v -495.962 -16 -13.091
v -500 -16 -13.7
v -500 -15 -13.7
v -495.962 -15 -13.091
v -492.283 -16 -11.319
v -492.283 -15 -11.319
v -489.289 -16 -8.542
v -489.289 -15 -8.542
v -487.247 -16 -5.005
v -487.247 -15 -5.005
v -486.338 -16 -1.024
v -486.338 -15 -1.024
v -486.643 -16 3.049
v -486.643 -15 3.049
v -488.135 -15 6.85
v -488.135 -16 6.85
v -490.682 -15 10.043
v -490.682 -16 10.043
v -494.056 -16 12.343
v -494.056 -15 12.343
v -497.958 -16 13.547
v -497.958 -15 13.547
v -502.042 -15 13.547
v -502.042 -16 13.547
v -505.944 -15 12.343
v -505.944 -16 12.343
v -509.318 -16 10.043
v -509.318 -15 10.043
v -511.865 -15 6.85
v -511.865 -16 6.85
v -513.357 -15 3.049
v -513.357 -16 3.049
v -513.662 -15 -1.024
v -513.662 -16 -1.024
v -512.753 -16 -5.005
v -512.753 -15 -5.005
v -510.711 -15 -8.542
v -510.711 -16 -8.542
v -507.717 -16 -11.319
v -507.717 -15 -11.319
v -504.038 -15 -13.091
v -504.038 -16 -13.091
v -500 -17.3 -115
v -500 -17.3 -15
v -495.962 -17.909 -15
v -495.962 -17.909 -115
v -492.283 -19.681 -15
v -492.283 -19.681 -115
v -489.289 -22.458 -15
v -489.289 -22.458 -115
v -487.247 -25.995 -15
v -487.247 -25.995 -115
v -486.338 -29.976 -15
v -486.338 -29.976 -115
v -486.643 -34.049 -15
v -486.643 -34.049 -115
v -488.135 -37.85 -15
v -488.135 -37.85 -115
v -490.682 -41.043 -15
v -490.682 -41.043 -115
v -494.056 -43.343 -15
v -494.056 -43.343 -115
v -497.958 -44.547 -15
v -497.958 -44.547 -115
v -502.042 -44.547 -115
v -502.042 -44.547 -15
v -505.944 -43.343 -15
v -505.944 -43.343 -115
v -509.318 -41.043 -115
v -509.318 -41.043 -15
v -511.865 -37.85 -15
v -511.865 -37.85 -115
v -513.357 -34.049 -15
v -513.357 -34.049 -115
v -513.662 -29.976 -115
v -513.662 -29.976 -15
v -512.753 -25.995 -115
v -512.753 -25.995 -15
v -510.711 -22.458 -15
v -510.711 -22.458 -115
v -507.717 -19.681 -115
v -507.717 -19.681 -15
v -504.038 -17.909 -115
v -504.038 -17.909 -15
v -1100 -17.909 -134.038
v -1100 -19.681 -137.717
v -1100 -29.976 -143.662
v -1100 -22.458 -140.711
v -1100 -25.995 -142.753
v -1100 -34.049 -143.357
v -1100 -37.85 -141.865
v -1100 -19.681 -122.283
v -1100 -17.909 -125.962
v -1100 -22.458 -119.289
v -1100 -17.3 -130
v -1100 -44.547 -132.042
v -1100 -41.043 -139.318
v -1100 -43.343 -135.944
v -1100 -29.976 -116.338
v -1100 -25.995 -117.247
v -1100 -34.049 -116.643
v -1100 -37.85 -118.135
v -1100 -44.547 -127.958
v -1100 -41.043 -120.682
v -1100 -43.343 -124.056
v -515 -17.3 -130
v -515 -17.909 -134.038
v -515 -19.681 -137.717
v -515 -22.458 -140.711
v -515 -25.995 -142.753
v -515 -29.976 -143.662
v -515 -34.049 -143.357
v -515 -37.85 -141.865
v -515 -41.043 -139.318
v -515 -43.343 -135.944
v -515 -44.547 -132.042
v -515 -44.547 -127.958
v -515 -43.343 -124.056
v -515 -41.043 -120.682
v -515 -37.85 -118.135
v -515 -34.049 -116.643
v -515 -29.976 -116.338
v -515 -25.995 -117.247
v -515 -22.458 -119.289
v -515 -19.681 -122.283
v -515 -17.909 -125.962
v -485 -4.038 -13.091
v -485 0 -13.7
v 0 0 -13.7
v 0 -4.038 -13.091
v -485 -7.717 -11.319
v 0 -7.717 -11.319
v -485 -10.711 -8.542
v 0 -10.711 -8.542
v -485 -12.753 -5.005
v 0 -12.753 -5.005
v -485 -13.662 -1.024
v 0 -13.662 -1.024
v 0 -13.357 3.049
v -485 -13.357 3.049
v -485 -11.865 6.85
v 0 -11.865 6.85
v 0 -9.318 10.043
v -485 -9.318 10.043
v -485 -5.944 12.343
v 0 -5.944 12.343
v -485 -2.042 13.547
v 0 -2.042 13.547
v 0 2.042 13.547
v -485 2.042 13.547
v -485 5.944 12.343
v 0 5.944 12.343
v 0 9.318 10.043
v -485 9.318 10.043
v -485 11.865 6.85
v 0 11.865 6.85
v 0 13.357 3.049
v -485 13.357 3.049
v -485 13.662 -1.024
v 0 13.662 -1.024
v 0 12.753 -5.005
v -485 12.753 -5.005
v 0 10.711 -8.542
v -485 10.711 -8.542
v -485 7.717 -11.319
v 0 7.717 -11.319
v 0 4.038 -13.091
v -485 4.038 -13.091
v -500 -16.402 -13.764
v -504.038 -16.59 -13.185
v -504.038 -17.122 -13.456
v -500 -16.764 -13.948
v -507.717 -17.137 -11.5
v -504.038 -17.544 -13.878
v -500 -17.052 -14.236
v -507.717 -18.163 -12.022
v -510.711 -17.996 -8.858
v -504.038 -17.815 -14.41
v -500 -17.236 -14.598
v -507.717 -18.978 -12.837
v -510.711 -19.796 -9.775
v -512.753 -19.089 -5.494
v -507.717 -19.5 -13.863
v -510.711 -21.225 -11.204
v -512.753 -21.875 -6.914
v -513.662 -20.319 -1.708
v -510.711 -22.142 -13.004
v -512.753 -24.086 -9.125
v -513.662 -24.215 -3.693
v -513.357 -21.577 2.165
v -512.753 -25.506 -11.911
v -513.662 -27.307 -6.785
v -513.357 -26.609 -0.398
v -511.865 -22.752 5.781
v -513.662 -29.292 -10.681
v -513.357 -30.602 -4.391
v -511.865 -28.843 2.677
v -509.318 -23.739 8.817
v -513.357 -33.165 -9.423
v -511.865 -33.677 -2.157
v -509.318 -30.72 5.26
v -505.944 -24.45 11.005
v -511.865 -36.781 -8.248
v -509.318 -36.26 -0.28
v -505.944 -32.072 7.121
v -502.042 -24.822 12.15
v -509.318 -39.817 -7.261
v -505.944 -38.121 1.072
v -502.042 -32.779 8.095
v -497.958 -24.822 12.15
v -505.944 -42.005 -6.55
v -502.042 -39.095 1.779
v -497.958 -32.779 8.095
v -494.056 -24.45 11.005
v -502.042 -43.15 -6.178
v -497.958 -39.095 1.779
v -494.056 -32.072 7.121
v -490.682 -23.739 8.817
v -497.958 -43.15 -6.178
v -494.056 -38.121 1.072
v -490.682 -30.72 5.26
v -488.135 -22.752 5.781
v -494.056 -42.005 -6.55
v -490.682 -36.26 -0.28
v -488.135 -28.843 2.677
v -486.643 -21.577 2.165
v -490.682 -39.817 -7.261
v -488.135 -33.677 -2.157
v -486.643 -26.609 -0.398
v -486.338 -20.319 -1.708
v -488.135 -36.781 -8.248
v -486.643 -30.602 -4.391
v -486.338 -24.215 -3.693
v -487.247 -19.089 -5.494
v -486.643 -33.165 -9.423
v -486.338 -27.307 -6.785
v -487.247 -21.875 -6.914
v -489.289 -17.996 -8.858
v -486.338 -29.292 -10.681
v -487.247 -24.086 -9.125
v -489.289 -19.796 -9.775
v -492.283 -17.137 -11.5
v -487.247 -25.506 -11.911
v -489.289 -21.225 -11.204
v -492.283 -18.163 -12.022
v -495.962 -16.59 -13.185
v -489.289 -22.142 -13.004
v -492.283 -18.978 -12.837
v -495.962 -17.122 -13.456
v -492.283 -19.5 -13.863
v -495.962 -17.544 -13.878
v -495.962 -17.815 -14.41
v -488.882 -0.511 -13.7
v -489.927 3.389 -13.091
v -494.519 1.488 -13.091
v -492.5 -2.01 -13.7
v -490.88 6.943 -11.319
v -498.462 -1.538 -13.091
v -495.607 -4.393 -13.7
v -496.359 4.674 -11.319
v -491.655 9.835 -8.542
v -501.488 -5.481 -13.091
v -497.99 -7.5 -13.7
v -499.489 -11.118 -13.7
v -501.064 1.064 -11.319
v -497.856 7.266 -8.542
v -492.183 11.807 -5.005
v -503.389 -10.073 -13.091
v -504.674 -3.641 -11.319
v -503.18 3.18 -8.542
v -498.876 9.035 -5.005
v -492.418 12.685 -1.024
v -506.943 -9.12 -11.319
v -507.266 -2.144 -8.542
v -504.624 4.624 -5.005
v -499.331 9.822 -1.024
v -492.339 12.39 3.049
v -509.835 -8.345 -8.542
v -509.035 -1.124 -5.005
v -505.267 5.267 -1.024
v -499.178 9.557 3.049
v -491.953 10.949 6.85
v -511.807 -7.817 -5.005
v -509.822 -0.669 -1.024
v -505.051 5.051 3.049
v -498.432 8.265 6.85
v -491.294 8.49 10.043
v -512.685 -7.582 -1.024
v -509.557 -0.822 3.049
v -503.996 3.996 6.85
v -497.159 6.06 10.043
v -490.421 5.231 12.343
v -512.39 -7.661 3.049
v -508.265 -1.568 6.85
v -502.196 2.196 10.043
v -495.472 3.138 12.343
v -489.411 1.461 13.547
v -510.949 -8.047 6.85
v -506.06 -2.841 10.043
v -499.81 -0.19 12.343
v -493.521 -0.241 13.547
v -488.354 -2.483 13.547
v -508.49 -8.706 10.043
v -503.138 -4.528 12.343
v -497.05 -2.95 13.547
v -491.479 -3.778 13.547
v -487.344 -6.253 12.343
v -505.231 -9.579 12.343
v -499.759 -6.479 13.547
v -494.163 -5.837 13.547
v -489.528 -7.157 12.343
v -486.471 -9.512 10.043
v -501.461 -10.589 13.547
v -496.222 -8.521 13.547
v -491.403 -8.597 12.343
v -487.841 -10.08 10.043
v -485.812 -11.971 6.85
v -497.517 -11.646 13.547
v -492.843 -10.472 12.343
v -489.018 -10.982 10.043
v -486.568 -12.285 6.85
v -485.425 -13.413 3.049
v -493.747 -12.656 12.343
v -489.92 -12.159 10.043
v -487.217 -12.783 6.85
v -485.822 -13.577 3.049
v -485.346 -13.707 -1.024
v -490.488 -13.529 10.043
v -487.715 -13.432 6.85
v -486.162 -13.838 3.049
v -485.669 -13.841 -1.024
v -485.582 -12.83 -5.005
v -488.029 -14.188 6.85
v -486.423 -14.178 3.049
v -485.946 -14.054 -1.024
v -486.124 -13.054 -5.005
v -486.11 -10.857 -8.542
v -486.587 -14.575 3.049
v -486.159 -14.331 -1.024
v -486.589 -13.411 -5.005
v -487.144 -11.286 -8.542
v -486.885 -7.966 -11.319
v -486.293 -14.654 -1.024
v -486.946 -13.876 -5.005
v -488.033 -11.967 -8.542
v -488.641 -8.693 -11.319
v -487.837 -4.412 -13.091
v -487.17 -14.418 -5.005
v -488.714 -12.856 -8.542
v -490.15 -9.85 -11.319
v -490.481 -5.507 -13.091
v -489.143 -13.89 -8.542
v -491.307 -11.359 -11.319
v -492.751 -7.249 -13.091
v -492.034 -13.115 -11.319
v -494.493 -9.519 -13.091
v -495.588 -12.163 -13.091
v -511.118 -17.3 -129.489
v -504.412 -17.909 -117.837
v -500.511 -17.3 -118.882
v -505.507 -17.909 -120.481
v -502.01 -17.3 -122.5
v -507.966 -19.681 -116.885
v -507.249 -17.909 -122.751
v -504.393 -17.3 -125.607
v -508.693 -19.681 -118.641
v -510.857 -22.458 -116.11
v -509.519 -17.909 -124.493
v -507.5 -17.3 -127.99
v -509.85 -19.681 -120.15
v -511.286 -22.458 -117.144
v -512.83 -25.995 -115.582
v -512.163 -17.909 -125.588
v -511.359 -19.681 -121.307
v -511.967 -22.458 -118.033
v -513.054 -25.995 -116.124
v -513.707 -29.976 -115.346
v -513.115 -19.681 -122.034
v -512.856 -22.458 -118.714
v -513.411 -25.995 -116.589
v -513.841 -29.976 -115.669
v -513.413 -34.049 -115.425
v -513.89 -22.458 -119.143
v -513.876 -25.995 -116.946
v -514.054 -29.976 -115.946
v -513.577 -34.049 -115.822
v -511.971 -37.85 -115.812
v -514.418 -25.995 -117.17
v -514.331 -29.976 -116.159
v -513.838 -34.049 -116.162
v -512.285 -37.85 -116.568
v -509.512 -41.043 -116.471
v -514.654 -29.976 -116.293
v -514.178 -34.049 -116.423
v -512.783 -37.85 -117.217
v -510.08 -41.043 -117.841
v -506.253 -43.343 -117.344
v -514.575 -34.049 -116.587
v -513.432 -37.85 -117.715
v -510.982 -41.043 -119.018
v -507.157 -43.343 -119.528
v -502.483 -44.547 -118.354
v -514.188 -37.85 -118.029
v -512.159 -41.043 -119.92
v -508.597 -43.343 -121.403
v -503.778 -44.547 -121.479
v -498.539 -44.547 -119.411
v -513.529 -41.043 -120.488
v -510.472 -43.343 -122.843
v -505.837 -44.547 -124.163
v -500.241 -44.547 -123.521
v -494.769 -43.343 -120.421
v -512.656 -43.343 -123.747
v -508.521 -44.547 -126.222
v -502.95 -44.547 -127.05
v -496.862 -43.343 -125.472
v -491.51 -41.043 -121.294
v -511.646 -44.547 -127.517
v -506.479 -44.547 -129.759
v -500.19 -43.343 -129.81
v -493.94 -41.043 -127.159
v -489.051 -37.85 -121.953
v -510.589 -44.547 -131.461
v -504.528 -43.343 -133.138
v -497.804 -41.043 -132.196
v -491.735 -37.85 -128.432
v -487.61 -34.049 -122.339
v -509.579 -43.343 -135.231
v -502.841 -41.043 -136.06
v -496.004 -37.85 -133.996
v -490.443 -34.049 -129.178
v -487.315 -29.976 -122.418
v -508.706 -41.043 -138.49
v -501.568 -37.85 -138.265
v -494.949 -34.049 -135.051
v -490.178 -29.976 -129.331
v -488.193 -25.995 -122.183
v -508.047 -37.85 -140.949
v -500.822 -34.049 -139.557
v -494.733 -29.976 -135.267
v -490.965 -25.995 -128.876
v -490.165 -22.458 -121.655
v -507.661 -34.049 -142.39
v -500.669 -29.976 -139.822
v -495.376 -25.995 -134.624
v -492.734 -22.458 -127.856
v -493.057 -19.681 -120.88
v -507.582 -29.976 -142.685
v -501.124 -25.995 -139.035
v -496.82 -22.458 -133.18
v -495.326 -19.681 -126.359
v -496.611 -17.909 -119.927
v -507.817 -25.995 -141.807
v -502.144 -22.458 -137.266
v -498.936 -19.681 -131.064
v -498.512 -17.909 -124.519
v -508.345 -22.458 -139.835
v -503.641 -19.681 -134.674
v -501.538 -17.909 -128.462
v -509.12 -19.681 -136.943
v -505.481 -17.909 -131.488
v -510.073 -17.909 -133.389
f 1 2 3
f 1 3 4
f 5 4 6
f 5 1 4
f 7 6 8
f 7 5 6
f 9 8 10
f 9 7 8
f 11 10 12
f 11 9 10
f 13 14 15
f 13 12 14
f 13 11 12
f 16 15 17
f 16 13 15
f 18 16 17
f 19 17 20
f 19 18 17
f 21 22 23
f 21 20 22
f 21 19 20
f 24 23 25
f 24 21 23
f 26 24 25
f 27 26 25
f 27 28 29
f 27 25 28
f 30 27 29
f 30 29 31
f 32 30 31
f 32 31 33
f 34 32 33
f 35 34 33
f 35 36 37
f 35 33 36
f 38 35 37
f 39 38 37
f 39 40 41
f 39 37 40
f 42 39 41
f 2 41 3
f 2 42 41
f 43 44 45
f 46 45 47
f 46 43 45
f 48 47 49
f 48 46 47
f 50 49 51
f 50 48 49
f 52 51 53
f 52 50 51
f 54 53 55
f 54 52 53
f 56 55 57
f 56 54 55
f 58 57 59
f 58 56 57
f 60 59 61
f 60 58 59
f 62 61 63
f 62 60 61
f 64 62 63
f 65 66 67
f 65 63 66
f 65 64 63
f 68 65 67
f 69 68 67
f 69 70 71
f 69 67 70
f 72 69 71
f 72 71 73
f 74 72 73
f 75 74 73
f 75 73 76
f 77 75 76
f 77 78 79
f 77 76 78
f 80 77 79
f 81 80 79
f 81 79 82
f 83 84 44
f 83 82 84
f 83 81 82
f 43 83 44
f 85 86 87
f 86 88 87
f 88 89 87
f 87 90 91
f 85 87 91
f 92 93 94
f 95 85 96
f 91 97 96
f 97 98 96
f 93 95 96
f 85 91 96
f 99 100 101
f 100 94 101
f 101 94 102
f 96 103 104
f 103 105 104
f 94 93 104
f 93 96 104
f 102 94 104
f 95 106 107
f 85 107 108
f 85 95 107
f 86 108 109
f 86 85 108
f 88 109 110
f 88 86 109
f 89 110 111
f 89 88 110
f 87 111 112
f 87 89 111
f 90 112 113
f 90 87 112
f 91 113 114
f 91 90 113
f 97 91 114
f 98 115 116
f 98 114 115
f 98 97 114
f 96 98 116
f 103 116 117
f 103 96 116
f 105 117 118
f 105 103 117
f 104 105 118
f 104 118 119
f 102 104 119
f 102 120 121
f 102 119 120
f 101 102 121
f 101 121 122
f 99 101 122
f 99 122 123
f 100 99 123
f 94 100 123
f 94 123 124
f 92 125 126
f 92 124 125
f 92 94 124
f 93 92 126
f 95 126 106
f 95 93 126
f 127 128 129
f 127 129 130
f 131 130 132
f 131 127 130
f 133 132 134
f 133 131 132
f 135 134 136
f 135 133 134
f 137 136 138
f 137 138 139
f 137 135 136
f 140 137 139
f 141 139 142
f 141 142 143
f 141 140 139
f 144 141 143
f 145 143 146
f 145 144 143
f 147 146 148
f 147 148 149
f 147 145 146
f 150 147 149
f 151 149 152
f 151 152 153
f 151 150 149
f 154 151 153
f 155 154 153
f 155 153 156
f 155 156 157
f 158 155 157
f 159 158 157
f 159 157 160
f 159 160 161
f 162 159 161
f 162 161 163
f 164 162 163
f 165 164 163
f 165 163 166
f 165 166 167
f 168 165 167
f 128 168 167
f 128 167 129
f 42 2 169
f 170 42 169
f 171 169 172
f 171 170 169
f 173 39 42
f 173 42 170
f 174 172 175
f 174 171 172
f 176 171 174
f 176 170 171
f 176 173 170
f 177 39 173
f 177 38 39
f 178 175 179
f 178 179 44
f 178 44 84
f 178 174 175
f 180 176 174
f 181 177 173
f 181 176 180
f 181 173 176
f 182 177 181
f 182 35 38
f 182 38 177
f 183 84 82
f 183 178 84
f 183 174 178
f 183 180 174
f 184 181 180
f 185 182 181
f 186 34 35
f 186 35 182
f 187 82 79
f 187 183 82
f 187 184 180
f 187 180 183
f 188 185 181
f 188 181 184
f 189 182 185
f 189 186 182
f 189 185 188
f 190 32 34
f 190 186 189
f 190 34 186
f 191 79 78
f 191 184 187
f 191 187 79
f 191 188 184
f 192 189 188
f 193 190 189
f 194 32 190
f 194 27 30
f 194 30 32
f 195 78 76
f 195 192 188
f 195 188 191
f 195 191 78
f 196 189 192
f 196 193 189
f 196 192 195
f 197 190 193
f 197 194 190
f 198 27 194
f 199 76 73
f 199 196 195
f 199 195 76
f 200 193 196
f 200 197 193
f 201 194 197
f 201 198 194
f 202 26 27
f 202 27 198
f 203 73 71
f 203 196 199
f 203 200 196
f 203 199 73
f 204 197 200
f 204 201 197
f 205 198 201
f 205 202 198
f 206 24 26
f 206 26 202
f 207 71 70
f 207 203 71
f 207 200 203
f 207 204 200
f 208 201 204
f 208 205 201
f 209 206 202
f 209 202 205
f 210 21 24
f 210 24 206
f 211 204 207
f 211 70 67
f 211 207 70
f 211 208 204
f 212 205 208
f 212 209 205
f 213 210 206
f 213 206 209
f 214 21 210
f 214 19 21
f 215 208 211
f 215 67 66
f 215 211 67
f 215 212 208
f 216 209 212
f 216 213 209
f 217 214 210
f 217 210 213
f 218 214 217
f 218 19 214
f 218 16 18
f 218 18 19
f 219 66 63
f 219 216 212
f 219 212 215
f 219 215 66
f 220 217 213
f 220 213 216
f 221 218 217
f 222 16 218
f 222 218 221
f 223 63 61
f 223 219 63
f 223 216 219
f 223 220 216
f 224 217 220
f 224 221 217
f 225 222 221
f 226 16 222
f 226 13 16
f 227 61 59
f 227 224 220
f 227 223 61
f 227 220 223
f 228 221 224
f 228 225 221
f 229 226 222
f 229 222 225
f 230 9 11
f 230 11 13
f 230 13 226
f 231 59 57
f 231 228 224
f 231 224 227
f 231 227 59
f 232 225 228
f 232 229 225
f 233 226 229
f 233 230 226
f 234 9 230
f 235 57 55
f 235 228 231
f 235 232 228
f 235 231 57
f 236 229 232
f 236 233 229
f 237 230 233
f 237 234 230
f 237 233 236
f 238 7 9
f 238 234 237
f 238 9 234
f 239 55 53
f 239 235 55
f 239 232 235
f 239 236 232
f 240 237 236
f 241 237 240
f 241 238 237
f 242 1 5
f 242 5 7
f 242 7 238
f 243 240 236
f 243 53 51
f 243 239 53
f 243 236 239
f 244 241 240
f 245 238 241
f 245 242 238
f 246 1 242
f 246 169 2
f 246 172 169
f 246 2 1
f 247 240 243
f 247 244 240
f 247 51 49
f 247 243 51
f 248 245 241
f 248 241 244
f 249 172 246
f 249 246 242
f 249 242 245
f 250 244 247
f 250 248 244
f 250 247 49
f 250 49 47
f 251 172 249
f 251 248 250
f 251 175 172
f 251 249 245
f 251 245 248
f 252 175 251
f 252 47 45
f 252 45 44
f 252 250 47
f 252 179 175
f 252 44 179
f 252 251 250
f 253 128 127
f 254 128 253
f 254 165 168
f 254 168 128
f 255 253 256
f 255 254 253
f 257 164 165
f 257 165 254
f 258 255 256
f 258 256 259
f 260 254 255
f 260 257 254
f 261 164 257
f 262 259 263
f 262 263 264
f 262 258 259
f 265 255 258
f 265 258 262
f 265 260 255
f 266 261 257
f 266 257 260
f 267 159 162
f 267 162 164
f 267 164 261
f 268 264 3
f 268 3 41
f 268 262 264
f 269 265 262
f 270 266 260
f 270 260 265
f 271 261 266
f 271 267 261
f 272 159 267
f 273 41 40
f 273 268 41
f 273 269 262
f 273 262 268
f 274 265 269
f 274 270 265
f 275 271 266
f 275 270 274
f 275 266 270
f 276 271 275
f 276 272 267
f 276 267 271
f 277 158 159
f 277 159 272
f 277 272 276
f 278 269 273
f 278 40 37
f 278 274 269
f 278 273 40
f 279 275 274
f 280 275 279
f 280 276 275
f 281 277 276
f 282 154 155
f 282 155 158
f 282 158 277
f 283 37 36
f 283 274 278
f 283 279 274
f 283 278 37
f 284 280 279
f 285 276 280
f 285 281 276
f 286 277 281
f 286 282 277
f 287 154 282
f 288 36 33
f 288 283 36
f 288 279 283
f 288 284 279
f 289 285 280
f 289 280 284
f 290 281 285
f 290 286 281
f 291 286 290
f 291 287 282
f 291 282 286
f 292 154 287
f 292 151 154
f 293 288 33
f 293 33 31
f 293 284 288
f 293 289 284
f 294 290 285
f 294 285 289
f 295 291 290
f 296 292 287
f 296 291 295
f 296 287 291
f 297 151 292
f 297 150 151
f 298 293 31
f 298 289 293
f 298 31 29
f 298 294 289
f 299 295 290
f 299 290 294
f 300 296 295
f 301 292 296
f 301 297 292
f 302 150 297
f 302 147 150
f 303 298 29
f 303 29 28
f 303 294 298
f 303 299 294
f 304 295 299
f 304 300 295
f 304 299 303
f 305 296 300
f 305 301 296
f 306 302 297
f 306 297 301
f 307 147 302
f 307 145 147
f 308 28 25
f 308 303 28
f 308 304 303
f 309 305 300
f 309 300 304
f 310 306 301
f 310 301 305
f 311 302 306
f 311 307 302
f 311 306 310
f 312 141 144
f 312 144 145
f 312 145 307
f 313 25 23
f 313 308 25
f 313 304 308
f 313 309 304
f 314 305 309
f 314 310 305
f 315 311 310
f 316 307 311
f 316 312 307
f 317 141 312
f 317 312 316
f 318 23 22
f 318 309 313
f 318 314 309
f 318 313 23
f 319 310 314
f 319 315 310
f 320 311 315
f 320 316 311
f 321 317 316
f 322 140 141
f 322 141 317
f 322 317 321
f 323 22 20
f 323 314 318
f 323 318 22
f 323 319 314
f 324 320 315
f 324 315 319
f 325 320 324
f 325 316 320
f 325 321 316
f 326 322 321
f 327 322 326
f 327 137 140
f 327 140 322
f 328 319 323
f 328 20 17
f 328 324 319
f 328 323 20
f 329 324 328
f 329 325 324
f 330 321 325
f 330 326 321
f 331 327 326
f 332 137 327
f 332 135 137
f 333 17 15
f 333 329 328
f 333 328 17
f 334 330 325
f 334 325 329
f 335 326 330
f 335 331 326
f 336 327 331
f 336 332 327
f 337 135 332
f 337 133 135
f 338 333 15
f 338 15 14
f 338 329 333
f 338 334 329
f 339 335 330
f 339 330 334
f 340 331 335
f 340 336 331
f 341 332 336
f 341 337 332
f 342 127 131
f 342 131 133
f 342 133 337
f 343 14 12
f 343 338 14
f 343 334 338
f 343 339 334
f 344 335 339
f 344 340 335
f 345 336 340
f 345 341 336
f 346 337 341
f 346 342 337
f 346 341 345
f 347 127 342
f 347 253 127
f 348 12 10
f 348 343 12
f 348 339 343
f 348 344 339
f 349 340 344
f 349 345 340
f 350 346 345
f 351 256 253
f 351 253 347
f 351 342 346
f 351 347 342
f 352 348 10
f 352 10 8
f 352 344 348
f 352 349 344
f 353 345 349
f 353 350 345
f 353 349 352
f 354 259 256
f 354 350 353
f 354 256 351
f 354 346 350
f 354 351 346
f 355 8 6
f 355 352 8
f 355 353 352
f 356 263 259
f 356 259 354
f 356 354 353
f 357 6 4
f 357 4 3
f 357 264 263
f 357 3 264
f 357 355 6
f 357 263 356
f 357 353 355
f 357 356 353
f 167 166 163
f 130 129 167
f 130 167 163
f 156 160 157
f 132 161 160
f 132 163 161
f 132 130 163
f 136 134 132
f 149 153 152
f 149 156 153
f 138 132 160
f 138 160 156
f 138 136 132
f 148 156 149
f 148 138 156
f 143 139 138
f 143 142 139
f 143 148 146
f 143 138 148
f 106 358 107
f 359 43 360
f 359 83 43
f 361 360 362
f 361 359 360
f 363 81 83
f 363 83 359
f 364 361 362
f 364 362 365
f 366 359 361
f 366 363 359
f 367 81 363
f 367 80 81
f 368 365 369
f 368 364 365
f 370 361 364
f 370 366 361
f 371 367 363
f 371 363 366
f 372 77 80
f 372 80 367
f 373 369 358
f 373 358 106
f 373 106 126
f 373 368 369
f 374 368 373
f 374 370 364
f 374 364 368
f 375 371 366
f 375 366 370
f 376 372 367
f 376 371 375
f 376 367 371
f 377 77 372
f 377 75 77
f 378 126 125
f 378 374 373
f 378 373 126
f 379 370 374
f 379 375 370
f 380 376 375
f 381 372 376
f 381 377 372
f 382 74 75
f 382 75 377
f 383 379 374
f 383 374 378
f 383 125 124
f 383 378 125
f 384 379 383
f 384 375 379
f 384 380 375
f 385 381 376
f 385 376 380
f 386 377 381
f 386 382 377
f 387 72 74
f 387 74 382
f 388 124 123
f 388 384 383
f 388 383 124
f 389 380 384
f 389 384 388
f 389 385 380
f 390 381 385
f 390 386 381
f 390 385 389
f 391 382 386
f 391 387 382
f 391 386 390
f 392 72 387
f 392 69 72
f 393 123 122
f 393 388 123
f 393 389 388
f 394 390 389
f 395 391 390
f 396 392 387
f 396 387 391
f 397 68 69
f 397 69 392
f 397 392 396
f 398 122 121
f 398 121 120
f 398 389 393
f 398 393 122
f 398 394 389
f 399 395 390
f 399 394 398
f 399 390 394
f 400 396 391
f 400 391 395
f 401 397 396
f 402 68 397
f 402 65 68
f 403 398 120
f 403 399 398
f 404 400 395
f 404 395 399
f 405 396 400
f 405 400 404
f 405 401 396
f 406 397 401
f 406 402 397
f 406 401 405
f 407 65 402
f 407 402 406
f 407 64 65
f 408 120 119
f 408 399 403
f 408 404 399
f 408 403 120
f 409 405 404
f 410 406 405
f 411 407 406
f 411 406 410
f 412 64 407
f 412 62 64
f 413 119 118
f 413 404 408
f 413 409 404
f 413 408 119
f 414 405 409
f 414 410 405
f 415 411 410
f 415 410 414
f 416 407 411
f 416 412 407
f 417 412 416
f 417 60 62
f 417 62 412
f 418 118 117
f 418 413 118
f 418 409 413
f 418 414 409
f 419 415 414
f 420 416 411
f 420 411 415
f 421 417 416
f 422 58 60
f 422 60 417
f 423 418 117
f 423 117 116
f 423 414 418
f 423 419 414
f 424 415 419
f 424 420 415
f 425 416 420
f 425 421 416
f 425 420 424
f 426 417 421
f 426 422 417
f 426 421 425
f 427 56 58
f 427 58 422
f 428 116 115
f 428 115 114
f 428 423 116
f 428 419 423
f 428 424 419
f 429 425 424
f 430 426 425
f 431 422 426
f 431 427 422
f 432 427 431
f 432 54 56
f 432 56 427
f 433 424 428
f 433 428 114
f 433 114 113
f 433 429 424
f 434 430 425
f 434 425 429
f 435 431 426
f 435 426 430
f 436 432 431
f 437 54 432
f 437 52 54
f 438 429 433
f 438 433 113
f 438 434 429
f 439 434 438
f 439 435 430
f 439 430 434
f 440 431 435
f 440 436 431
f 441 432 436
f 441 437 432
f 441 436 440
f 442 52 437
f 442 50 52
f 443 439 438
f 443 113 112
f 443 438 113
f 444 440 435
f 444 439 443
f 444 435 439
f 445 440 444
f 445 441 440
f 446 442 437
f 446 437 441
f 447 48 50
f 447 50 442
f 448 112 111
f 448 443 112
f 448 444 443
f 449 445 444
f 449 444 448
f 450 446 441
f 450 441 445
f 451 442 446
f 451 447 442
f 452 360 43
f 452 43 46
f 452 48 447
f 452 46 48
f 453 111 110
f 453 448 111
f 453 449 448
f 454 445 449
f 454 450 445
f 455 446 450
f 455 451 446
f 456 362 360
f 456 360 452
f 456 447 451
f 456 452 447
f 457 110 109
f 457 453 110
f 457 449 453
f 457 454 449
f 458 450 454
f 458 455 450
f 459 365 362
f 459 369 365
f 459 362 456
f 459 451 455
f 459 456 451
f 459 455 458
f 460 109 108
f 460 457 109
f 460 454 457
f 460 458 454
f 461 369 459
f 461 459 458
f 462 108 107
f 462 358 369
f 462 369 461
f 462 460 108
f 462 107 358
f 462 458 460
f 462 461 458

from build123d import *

# Parameters (mm, degrees)
CROQUIS1_R = 13.7


with BuildPart() as part:
    # Barrer1: sweep along a curve in space
    with BuildLine() as barrer1_path:
        Line((0, 0, 0), (-485, 0, 0))
        ThreePointArc((-485, 0, 0), (-495.606601718, -4.393398282, 0), (-500, -15, 0))
        Line((-500, -15, 0), (-500, -16, 0))
        ThreePointArc((-500, -16, 0), (-500, -26.606601718, -4.393398282), (-500, -31, -15))
        Line((-500, -31, -15), (-500, -31, -115))
        ThreePointArc((-500, -31, -115), (-504.393398282, -31, -125.606601718), (-515, -31, -130))
        Line((-515, -31, -130), (-1100, -31, -130))
    # Croquis1 → Barrer1 (sweep)
    with BuildSketch(Plane(origin=(0, 0, 0), x_dir=(0, 0, -1), z_dir=(1, 0, 0))):
        Circle(CROQUIS1_R)
    sweep(path=barrer1_path.line)


solid = part.part
